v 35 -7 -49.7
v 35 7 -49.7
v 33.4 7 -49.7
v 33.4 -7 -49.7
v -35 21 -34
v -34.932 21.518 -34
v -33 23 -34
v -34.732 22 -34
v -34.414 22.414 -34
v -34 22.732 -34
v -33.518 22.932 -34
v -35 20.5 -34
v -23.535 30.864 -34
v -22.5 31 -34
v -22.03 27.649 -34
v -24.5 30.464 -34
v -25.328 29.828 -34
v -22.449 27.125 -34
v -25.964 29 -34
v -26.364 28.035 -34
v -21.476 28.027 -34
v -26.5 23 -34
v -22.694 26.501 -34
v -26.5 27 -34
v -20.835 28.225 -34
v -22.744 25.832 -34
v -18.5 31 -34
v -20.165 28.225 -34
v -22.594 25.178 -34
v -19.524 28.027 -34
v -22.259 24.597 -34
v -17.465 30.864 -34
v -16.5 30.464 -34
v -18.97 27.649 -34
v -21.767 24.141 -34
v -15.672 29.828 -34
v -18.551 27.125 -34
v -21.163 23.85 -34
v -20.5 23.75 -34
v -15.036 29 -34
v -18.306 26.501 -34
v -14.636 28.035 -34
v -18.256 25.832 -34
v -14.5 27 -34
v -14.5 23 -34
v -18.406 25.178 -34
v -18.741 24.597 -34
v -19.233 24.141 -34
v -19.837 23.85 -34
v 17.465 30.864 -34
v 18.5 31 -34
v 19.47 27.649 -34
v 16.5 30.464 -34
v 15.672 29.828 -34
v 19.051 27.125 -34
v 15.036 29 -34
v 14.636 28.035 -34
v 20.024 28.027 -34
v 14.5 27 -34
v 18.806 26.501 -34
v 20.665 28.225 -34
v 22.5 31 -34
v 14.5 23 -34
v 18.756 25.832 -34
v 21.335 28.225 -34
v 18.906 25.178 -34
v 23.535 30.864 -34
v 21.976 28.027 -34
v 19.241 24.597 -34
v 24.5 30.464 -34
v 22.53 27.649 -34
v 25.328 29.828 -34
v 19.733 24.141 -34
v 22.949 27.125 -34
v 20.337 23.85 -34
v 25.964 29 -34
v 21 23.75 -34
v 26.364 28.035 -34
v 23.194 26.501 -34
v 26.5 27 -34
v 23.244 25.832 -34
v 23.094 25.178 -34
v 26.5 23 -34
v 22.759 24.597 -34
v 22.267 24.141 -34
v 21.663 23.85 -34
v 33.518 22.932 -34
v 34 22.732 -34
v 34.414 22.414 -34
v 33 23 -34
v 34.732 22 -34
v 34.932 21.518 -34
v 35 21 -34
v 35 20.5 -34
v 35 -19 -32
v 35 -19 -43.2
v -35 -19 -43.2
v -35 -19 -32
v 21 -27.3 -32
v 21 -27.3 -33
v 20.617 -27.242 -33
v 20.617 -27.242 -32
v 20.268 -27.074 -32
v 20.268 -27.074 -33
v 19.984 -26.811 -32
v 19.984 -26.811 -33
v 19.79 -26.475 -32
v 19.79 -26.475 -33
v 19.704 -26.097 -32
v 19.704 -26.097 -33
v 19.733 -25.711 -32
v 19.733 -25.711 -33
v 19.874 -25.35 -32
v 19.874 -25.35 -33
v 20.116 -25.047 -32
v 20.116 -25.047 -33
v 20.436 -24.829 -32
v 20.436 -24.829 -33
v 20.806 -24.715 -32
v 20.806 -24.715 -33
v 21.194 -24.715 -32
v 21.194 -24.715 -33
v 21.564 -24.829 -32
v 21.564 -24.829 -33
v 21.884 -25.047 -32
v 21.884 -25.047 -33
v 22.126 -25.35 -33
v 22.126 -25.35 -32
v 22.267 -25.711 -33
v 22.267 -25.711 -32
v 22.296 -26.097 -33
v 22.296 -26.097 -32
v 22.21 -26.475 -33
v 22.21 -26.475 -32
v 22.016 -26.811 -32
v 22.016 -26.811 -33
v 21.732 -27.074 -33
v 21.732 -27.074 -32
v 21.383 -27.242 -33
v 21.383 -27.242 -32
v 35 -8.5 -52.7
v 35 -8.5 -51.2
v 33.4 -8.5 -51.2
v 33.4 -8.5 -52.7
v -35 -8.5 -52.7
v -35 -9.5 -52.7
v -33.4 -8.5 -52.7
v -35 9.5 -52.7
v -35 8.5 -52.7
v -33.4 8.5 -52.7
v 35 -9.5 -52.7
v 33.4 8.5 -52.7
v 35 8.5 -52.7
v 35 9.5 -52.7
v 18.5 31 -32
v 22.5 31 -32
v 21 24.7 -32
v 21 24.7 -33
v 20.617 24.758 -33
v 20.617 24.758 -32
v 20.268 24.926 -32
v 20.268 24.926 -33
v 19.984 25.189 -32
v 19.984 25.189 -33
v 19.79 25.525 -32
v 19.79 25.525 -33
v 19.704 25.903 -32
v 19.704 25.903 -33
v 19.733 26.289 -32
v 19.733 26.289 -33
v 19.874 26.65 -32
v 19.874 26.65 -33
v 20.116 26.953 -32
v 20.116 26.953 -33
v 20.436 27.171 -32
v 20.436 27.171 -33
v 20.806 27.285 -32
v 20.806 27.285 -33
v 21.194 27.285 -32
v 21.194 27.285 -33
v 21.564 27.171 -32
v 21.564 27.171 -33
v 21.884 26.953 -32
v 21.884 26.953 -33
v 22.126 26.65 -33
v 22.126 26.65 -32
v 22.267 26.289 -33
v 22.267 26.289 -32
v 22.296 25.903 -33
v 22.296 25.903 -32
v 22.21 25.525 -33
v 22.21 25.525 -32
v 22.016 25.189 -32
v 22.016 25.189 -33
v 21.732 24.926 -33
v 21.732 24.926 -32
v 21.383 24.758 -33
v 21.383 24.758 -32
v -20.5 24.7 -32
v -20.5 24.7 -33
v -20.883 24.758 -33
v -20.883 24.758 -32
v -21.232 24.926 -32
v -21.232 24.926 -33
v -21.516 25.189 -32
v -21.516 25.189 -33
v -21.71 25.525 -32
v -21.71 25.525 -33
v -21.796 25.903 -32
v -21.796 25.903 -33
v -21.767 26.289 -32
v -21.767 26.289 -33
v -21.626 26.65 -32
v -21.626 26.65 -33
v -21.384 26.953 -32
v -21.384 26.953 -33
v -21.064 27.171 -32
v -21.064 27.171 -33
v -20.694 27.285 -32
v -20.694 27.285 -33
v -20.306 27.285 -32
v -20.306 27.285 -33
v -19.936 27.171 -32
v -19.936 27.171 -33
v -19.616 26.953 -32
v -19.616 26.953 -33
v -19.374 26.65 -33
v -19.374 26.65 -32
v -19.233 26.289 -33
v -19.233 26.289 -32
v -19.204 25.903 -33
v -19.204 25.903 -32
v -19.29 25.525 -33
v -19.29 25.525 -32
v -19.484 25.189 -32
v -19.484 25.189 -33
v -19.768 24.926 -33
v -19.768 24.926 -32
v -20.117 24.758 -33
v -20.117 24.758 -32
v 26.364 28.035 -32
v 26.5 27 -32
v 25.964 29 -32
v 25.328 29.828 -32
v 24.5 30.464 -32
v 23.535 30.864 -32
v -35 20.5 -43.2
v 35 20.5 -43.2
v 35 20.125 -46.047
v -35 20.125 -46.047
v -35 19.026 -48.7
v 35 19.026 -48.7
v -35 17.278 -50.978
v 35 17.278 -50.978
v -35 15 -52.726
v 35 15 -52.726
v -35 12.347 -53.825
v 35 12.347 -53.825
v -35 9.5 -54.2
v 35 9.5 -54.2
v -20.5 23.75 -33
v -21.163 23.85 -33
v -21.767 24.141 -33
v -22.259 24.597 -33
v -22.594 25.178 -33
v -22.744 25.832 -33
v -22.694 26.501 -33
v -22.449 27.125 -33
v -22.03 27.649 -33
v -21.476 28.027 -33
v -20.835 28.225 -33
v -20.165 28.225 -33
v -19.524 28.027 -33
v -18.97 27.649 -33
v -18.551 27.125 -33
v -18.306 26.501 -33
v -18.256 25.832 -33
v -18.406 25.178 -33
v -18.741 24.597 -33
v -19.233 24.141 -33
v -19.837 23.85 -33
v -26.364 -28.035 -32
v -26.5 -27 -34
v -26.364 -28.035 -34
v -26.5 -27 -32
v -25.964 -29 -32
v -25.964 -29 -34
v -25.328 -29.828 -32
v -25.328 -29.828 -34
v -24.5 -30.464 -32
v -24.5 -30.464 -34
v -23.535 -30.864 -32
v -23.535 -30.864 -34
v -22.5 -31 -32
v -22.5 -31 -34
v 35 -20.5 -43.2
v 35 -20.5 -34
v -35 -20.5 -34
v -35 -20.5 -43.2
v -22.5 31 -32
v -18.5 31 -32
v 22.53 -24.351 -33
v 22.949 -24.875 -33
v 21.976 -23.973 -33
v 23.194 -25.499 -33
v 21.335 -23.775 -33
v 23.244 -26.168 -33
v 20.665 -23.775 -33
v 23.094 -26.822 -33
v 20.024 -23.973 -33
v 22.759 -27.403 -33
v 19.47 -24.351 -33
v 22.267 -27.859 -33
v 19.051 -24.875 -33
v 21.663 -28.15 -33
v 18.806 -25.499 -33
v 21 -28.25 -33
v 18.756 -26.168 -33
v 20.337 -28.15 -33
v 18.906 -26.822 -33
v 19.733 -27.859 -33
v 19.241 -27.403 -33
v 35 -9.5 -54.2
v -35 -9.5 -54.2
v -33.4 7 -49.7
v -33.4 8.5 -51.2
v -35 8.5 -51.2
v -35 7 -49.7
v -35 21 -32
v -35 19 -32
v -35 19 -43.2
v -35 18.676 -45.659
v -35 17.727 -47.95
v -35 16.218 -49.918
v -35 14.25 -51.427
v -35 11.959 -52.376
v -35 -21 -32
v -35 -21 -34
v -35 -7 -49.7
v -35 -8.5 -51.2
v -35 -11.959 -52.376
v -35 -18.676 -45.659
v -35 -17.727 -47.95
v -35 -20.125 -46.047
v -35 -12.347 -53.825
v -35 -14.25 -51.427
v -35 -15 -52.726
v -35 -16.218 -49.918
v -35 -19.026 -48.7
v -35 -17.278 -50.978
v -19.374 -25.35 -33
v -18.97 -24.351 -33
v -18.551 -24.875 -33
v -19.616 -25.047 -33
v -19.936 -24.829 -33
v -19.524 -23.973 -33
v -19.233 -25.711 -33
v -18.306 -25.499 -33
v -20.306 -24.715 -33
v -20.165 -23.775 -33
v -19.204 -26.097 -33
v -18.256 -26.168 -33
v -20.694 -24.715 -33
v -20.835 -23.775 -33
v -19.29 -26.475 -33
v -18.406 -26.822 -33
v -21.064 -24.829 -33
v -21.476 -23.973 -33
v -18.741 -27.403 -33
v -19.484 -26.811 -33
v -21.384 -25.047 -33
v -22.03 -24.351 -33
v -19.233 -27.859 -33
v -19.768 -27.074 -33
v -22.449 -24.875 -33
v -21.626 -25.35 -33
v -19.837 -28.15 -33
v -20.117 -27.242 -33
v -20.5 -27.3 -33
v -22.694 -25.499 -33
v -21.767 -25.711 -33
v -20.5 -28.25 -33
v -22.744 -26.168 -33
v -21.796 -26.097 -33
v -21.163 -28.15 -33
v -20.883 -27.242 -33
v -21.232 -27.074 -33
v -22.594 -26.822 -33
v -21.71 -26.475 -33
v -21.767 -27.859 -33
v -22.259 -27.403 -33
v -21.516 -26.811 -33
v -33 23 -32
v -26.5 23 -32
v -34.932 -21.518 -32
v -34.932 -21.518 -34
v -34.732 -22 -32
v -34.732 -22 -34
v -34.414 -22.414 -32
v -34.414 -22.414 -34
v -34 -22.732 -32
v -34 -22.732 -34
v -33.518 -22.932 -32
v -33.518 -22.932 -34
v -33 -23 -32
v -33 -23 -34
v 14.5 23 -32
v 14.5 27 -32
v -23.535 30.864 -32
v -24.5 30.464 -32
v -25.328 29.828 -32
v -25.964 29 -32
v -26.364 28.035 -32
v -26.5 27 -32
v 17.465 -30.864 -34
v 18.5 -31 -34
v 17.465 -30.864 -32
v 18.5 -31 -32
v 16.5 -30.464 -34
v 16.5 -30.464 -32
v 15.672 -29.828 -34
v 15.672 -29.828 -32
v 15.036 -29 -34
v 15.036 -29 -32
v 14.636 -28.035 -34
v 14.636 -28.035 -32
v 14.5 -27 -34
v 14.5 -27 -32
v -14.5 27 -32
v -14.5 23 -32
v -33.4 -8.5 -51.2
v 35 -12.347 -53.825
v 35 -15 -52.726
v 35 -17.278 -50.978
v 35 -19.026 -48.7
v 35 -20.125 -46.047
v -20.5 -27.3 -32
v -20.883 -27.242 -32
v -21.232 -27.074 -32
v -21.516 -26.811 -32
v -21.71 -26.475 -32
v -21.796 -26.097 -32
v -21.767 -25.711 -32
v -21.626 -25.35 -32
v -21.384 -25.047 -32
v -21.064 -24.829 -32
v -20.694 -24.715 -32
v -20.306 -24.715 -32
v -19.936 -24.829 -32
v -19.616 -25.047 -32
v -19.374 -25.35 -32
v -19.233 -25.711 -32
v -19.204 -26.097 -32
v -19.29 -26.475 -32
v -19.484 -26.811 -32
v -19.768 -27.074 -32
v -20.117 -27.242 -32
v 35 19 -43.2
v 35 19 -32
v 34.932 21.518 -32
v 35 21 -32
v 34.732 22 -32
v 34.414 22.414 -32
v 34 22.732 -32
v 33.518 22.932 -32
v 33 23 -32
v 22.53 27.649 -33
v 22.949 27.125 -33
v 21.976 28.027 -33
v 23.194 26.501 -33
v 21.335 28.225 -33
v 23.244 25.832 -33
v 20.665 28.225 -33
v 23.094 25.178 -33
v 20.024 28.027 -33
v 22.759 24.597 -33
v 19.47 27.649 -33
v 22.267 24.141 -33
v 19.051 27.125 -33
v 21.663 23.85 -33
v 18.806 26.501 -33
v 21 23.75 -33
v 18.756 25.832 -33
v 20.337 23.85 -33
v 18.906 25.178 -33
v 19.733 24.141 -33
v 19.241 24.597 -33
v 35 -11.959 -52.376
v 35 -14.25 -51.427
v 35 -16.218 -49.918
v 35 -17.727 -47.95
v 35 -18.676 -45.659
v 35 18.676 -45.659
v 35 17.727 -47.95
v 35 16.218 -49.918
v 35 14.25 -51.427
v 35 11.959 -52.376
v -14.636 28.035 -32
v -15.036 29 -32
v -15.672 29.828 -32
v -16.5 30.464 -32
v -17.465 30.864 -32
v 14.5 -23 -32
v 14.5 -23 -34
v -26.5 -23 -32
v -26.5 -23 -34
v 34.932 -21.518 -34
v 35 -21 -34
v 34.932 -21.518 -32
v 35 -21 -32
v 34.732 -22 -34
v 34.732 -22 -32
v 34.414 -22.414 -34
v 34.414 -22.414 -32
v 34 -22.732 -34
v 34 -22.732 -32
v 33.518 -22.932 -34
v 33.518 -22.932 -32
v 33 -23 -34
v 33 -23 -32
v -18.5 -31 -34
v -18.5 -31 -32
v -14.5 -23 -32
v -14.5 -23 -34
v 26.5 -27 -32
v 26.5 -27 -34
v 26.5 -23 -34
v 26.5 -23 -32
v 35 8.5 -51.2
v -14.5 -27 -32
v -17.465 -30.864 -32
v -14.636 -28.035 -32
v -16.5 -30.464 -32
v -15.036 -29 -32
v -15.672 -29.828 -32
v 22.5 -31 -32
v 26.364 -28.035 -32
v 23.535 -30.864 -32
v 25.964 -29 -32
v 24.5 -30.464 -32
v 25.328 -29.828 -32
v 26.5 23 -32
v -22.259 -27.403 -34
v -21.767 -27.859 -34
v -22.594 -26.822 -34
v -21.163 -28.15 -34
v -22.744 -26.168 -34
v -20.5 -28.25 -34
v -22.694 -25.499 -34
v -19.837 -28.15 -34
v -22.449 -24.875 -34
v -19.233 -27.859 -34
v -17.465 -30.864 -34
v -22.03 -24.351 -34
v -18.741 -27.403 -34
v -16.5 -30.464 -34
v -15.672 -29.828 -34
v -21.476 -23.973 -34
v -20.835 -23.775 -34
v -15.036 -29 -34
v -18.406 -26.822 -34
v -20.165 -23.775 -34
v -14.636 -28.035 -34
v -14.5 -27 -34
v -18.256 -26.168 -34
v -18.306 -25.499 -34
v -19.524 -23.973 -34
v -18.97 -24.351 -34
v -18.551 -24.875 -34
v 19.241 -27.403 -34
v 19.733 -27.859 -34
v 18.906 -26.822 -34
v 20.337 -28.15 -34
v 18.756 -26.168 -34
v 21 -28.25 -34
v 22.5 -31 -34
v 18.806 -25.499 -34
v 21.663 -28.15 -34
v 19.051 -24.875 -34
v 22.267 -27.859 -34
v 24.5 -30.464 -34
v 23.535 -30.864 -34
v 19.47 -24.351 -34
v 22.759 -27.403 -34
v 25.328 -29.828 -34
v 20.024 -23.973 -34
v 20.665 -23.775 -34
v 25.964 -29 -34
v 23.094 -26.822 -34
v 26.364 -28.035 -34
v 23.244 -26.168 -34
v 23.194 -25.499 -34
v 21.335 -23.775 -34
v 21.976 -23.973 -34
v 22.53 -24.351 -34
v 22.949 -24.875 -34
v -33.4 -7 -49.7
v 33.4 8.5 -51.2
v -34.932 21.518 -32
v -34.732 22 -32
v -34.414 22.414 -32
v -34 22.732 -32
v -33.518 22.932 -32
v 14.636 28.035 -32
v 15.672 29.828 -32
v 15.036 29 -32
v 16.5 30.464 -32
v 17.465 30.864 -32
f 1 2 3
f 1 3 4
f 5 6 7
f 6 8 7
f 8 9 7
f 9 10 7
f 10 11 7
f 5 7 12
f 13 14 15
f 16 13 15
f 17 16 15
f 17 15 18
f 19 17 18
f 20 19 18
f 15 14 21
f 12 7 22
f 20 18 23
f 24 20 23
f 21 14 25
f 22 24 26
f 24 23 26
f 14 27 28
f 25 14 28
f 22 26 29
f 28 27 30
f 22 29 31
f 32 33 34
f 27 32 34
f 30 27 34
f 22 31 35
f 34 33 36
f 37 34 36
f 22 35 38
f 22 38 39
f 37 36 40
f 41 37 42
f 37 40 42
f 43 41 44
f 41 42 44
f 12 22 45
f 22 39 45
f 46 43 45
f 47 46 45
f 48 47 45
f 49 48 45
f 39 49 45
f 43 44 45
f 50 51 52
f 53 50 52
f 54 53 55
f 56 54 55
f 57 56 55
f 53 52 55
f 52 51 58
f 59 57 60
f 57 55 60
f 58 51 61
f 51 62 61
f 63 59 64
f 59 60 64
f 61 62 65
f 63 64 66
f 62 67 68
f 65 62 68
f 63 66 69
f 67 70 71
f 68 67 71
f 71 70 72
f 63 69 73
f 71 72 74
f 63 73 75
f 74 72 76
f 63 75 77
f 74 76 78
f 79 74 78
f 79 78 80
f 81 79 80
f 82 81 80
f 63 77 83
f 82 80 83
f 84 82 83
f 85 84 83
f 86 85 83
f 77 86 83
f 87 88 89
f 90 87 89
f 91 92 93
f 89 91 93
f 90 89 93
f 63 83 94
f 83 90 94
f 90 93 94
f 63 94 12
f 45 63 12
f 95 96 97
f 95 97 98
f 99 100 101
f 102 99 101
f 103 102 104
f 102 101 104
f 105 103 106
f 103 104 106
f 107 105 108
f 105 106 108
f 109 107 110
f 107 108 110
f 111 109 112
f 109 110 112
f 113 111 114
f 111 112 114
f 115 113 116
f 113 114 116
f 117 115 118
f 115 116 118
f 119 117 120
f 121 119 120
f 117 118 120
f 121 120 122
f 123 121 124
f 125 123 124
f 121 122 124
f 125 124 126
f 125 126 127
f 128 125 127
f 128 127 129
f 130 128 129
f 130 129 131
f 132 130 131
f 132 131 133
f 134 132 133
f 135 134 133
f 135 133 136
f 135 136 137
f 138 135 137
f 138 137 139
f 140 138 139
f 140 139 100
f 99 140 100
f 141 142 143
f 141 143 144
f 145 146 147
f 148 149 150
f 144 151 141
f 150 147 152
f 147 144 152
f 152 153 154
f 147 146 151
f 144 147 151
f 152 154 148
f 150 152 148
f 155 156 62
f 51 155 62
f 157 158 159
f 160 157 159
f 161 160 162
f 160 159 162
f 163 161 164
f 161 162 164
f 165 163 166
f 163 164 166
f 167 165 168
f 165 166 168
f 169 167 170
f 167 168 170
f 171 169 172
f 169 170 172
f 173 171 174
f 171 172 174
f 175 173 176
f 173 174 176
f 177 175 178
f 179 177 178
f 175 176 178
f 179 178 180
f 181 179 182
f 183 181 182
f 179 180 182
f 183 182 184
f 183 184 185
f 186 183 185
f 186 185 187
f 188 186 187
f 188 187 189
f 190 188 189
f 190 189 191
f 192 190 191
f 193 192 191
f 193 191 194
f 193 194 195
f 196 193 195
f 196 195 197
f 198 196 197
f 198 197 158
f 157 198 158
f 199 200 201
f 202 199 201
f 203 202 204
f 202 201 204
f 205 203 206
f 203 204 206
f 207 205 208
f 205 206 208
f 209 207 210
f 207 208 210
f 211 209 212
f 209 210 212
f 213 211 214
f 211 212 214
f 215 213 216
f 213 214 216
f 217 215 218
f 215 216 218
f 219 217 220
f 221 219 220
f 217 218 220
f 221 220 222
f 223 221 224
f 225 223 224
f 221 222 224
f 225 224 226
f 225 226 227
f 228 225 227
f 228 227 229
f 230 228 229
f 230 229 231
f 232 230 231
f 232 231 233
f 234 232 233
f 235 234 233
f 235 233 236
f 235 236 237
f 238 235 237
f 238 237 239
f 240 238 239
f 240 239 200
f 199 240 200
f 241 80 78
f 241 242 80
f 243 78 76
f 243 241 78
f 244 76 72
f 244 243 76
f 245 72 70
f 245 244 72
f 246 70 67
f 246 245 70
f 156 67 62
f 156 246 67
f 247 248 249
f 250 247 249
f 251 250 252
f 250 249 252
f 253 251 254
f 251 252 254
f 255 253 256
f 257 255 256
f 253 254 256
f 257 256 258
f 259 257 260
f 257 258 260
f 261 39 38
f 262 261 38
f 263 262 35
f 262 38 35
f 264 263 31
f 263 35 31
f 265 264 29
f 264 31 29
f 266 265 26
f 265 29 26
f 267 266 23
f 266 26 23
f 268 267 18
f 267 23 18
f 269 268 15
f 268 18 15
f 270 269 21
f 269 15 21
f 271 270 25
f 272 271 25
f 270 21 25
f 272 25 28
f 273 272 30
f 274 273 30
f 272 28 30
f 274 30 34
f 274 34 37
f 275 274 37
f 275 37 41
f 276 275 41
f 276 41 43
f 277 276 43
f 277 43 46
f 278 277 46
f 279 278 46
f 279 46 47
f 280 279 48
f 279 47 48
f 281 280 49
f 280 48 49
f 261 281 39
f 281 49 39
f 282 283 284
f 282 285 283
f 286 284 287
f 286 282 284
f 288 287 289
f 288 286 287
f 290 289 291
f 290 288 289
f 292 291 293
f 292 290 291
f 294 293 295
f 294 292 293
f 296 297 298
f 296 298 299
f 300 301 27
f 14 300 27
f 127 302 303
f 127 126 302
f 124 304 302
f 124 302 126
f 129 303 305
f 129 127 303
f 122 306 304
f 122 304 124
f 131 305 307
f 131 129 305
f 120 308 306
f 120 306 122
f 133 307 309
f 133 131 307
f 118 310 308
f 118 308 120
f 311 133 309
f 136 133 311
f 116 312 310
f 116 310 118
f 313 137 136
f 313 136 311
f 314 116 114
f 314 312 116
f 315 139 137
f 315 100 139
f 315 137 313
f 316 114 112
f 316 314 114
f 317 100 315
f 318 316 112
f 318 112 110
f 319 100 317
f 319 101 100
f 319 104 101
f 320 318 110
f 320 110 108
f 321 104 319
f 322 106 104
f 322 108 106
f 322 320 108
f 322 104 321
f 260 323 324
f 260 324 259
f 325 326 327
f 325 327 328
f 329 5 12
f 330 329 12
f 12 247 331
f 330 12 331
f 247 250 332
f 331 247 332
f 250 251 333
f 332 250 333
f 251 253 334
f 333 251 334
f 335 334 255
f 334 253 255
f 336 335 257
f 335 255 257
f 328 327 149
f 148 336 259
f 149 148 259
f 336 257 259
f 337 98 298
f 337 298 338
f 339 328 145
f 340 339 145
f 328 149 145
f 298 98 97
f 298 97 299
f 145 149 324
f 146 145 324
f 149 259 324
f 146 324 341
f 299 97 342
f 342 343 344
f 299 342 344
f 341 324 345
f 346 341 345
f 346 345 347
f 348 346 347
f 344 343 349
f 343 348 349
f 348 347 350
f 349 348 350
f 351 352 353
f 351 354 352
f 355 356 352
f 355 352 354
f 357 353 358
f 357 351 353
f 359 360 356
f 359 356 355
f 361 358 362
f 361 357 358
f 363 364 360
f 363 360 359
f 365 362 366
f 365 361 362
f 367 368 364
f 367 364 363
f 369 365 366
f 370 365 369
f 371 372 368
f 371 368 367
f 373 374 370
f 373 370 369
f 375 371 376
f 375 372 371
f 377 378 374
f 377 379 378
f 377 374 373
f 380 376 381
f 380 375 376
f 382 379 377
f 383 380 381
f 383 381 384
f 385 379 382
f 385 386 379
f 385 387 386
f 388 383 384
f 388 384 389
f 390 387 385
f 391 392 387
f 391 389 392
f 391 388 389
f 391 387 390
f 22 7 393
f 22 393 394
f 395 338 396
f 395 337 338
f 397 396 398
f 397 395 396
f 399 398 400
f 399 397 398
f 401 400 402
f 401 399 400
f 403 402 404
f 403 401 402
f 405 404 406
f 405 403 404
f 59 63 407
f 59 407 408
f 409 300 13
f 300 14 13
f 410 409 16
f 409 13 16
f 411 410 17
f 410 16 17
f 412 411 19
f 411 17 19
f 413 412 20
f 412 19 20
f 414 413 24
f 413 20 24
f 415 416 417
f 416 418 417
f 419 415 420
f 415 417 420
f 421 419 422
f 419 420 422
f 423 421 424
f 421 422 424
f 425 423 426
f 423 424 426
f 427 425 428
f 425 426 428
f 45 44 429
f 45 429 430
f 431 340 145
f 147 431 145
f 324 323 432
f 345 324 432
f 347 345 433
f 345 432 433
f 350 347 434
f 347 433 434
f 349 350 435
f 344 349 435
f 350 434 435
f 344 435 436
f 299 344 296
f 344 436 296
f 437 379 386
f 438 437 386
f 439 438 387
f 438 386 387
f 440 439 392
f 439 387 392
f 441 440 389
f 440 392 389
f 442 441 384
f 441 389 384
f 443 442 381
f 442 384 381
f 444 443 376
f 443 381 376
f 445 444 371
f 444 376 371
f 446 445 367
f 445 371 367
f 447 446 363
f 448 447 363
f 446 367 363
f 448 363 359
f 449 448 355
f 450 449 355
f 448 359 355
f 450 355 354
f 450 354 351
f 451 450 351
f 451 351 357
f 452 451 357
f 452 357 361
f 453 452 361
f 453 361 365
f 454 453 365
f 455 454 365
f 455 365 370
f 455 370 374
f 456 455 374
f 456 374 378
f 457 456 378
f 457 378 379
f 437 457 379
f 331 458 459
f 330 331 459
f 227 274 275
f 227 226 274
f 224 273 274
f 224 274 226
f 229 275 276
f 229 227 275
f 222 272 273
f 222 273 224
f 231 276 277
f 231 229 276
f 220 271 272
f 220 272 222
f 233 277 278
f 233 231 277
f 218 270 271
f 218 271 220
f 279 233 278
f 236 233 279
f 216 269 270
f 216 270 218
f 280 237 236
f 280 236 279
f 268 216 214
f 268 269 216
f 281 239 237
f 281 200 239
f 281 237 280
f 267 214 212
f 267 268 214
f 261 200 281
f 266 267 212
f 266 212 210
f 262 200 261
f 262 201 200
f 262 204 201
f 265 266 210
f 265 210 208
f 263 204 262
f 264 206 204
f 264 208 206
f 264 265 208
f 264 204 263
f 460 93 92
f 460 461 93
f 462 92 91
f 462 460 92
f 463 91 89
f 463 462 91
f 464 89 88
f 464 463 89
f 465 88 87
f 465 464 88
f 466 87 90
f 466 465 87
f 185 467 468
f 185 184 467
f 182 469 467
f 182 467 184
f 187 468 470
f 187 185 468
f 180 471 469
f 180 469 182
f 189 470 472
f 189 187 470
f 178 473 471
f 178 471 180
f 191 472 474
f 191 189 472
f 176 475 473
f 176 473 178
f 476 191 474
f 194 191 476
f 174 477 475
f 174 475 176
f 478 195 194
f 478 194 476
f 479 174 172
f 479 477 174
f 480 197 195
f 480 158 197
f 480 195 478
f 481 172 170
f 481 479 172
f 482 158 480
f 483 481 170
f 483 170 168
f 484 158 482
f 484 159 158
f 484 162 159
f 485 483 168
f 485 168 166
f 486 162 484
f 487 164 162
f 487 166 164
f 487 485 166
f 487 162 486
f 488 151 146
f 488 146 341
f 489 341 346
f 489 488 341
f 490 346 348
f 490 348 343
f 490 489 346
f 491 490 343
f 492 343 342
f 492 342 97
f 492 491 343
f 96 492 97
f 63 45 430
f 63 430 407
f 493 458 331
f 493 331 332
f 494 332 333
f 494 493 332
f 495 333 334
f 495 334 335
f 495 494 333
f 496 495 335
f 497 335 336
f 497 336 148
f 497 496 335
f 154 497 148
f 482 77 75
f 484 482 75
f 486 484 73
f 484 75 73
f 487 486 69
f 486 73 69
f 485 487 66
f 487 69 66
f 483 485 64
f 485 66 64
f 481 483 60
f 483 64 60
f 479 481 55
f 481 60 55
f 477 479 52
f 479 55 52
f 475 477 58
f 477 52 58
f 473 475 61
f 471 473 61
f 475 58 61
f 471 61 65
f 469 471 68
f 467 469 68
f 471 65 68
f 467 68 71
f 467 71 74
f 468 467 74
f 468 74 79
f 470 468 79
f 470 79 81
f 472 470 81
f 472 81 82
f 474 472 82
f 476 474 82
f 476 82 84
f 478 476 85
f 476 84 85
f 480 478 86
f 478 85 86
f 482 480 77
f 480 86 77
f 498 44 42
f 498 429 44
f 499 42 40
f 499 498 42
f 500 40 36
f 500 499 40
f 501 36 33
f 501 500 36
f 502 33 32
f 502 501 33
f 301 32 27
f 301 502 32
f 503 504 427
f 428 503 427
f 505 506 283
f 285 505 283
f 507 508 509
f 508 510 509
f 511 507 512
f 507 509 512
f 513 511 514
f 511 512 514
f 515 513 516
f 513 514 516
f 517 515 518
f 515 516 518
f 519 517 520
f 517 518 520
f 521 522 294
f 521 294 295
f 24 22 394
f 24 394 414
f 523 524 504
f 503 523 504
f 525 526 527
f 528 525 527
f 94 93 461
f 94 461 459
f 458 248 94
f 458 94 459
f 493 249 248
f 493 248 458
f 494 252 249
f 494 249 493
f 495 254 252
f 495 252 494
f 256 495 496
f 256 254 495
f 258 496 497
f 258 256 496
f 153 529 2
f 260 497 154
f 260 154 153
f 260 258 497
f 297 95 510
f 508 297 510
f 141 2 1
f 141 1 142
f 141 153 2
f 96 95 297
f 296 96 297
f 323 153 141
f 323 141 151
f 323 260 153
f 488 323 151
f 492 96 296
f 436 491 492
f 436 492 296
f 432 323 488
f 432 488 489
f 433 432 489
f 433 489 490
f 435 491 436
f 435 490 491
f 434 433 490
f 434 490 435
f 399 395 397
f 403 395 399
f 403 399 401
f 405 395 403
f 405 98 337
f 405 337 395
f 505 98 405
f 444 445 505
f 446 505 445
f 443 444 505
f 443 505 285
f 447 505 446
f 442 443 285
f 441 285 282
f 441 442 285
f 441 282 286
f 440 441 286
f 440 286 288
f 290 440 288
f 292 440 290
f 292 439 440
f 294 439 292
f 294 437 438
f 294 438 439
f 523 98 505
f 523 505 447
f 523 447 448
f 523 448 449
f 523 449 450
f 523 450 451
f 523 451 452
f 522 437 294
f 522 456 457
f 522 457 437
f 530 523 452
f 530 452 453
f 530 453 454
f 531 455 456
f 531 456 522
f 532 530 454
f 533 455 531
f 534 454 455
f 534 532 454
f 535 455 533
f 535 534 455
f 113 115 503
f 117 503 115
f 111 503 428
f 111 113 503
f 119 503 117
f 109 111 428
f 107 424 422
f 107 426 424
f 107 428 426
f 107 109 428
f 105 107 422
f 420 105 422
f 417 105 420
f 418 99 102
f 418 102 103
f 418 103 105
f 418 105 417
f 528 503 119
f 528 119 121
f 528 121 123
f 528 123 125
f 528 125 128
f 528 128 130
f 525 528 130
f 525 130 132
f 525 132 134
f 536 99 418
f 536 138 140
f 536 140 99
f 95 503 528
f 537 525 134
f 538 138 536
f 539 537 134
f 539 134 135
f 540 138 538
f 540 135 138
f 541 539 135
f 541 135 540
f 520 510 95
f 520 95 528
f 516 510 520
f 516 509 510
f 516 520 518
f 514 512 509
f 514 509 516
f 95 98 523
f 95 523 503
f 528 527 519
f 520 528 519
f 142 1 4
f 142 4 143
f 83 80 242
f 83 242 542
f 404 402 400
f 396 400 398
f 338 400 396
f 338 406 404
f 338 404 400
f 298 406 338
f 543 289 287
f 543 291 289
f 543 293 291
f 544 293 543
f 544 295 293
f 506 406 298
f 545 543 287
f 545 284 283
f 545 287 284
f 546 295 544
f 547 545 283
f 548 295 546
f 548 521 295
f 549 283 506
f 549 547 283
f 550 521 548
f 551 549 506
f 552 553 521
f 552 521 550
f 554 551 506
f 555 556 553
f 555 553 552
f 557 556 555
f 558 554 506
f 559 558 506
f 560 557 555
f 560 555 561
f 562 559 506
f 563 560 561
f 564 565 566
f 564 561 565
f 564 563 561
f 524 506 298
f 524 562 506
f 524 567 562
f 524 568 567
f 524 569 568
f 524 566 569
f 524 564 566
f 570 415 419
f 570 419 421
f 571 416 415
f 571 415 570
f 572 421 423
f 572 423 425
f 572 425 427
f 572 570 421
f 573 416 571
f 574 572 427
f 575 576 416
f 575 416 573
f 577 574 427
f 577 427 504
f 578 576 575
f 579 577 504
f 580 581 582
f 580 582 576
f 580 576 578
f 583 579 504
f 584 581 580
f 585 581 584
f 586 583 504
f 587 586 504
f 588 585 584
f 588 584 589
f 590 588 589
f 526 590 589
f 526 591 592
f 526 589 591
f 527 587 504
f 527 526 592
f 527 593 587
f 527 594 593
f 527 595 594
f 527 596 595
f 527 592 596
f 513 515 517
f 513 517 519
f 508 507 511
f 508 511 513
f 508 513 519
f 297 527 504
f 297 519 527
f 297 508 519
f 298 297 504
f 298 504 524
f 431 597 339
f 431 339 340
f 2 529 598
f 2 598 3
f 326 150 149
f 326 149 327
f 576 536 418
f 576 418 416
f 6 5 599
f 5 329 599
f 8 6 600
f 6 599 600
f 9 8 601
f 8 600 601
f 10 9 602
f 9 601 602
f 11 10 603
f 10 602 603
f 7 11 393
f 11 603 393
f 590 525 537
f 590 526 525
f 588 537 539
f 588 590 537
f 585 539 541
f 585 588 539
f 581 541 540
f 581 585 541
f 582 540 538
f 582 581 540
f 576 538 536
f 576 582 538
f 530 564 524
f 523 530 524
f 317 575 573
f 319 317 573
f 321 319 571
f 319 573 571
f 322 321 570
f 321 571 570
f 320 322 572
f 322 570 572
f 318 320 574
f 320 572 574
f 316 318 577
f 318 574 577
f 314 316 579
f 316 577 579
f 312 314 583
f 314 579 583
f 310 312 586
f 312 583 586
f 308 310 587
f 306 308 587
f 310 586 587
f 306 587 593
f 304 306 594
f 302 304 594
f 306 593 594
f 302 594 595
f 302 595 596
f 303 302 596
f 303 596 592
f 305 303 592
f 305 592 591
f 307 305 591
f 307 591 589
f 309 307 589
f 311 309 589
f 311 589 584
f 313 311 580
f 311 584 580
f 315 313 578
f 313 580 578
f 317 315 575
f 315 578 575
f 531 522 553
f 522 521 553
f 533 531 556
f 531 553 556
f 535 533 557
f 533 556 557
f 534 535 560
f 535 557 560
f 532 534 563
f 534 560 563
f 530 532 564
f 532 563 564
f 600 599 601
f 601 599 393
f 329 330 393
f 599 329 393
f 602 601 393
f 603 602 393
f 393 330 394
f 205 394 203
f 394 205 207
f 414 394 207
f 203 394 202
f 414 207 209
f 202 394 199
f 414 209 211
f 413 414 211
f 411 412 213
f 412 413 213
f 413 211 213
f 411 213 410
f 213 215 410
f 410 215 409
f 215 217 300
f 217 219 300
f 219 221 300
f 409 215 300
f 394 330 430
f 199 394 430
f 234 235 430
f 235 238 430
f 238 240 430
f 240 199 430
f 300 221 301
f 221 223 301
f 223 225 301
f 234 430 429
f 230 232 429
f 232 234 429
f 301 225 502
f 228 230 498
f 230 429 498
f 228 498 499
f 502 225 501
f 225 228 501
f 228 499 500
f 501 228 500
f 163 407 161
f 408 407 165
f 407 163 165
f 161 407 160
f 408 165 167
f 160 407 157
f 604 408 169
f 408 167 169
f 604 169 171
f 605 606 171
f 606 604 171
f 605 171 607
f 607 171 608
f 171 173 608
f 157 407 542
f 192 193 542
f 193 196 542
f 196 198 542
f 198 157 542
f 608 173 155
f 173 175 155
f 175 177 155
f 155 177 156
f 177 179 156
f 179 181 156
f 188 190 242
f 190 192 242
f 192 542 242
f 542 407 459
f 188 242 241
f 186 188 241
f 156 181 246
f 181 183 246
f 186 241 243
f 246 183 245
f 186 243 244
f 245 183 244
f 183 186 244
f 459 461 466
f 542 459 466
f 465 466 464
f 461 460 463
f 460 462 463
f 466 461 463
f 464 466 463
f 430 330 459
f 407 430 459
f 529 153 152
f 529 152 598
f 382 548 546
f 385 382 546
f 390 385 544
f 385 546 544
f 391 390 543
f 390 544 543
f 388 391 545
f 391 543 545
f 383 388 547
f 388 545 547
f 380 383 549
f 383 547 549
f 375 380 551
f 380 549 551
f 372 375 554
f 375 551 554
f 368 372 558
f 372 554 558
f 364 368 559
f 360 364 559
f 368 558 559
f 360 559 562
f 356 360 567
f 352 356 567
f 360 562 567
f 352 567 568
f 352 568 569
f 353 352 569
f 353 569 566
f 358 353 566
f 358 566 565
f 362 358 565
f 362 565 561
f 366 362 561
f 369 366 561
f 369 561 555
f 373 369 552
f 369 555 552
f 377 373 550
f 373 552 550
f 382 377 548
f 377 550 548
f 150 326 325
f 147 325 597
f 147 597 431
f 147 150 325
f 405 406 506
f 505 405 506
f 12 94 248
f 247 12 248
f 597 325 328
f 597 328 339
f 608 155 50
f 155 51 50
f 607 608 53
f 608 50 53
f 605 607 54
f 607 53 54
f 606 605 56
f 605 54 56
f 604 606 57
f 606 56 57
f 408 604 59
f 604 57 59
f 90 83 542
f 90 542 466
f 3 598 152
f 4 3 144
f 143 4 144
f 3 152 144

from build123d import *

# Parameters (mm, degrees)
PAD006_DEPTH            = 70
POCKET014_DEPTH         = 2.001
SKETCH024_R             = 1.3
POCKET002_DEPTH         = 2.001
SKETCH025_R             = 2.25
POCKET015_DEPTH         = 1
PAD007_DEPTH            = 1.6
LINEARPATTERN_COUNT     = 2
LINEARPATTERN_PITCH     = 68.4
FILLET001_R             = 2
FILLET002_R             = 4
FILLET003_R             = 4
BODY002_PLACEMENT_ANGLE = 180


with BuildPart() as part:
    # Sketch022 → Pad006 (new body)
    with BuildSketch(Plane.YZ):
        with BuildLine():
            ThreePointArc((19, 11.2), (16.217514, 17.917514), (9.5, 20.7))
            Line((-9.5, 20.7), (9.5, 20.7))
            ThreePointArc((-9.5, 20.7), (-16.217514, 17.917514), (-19, 11.2))
            Line((-19, 11.2), (-19, 0))
            Line((-19, 0), (-31, 0))
            Line((-31, 0), (-31, 2))
            Line((-31, 2), (-20.5, 2))
            Line((-20.5, 2), (-20.5, 11.2))
            ThreePointArc((-9.5, 22.2), (-17.278175, 18.978175), (-20.5, 11.2))
            Line((-9.5, 22.2), (9.5, 22.2))
            ThreePointArc((20.5, 11.2), (17.278175, 18.978175), (9.5, 22.2))
            Line((20.5, 2), (20.5, 11.2))
            Line((31, 2), (20.5, 2))
            Line((31, 0), (31, 2))
            Line((19, 0), (31, 0))
            Line((19, 11.2), (19, 0))
        make_face()
    extrude(amount=PAD006_DEPTH)

    # Sketch023 (on Face13 of Pad006) → Pocket014 (cut, through all)
    with BuildSketch(Plane(origin=(0, 0, 2), x_dir=(0, -1, 0), z_dir=(0, 0, 1))):
        Polygon((23, 73), (23, 61.5), (35, 61.5), (35, 49.5), (23, 49.5), (23, 20.5), (35, 20.5), (35, 8.5), (23, 8.5), (23, -3), (46, -3), (46, 73), align=None)
        Polygon((-46, 73), (-23, 73), (-23, 61.5), (-35, 61.5), (-35, 49.5), (-23, 49.5), (-23, 20.5), (-35, 20.5), (-35, 8.5), (-23, 8.5), (-23, -3), (-46, -3), align=None)
    extrude(amount=-POCKET014_DEPTH, mode=Mode.SUBTRACT)

    # Sketch024 (on Face17 of Pocket014) → Pocket002 (cut, through all)
    with BuildSketch(Plane(origin=(0, 0, 2), x_dir=(0, -1, 0), z_dir=(0, 0, 1))):
        with Locations((26, 14)):
            Circle(SKETCH024_R)
        with Locations((-26, 14)):
            Circle(SKETCH024_R)
        with Locations((26, 55.5)):
            Circle(SKETCH024_R)
        with Locations((-26, 55.5)):
            Circle(SKETCH024_R)
    extrude(amount=-POCKET002_DEPTH, mode=Mode.SUBTRACT)

    # Sketch025 (on Face17 of Pocket002) → Pocket015 (cut)
    with BuildSketch(Plane(origin=(0, 0, 2), x_dir=(0, -1, 0), z_dir=(0, 0, 1))):
        with Locations((26, 55.5)):
            Circle(SKETCH025_R)
        with Locations((26, 14)):
            Circle(SKETCH025_R)
        with Locations((-26, 55.5)):
            Circle(SKETCH025_R)
        with Locations((-26, 14)):
            Circle(SKETCH025_R)
    extrude(amount=-POCKET015_DEPTH, mode=Mode.SUBTRACT)

    # Sketch026 → Pad007 (join)
    with BuildSketch(Plane.YZ):
        Polygon((-8.5, 21.7), (8.5, 21.7), (8.5, 19.2), (7, 17.7), (-7, 17.7), (-8.5, 19.2), align=None)
    pad007 = extrude(amount=PAD007_DEPTH)

    # LinearPattern: Pad007 ×2
    with Locations(*[(i * LINEARPATTERN_PITCH, 0, 0) for i in range(1, LINEARPATTERN_COUNT)]):
        add(pad007)

    # Fillet001
    fillet001_edges = [part.edges().sort_by_distance(p)[0] for p in [
        (70, 23, 1),
        (70, -23, 1),
        (0, -23, 1),
        (0, 23, 1),
    ]]
    fillet(fillet001_edges, radius=FILLET001_R)

    # Fillet002
    fillet002_edges = [part.edges().sort_by_distance(p)[0] for p in [
        (8.5, -31, 1),
        (20.5, -31, 1),
        (49.5, -31, 1),
        (61.5, -31, 1),
    ]]
    fillet(fillet002_edges, radius=FILLET002_R)

    # Fillet003
    fillet003_edges = [part.edges().sort_by_distance(p)[0] for p in [
        (61.5, 31, 1),
        (49.5, 31, 1),
        (20.5, 31, 1),
        (8.5, 31, 1),
    ]]
    fillet(fillet003_edges, radius=FILLET003_R)


with BuildPart() as part_1:
    # Body002 placement: moved
    add(part.part.moved(Location((35, 0, -32))).rotate(Axis((35, 0, -32), (0, 1, 0)), BODY002_PLACEMENT_ANGLE))


solid = part_1.part
